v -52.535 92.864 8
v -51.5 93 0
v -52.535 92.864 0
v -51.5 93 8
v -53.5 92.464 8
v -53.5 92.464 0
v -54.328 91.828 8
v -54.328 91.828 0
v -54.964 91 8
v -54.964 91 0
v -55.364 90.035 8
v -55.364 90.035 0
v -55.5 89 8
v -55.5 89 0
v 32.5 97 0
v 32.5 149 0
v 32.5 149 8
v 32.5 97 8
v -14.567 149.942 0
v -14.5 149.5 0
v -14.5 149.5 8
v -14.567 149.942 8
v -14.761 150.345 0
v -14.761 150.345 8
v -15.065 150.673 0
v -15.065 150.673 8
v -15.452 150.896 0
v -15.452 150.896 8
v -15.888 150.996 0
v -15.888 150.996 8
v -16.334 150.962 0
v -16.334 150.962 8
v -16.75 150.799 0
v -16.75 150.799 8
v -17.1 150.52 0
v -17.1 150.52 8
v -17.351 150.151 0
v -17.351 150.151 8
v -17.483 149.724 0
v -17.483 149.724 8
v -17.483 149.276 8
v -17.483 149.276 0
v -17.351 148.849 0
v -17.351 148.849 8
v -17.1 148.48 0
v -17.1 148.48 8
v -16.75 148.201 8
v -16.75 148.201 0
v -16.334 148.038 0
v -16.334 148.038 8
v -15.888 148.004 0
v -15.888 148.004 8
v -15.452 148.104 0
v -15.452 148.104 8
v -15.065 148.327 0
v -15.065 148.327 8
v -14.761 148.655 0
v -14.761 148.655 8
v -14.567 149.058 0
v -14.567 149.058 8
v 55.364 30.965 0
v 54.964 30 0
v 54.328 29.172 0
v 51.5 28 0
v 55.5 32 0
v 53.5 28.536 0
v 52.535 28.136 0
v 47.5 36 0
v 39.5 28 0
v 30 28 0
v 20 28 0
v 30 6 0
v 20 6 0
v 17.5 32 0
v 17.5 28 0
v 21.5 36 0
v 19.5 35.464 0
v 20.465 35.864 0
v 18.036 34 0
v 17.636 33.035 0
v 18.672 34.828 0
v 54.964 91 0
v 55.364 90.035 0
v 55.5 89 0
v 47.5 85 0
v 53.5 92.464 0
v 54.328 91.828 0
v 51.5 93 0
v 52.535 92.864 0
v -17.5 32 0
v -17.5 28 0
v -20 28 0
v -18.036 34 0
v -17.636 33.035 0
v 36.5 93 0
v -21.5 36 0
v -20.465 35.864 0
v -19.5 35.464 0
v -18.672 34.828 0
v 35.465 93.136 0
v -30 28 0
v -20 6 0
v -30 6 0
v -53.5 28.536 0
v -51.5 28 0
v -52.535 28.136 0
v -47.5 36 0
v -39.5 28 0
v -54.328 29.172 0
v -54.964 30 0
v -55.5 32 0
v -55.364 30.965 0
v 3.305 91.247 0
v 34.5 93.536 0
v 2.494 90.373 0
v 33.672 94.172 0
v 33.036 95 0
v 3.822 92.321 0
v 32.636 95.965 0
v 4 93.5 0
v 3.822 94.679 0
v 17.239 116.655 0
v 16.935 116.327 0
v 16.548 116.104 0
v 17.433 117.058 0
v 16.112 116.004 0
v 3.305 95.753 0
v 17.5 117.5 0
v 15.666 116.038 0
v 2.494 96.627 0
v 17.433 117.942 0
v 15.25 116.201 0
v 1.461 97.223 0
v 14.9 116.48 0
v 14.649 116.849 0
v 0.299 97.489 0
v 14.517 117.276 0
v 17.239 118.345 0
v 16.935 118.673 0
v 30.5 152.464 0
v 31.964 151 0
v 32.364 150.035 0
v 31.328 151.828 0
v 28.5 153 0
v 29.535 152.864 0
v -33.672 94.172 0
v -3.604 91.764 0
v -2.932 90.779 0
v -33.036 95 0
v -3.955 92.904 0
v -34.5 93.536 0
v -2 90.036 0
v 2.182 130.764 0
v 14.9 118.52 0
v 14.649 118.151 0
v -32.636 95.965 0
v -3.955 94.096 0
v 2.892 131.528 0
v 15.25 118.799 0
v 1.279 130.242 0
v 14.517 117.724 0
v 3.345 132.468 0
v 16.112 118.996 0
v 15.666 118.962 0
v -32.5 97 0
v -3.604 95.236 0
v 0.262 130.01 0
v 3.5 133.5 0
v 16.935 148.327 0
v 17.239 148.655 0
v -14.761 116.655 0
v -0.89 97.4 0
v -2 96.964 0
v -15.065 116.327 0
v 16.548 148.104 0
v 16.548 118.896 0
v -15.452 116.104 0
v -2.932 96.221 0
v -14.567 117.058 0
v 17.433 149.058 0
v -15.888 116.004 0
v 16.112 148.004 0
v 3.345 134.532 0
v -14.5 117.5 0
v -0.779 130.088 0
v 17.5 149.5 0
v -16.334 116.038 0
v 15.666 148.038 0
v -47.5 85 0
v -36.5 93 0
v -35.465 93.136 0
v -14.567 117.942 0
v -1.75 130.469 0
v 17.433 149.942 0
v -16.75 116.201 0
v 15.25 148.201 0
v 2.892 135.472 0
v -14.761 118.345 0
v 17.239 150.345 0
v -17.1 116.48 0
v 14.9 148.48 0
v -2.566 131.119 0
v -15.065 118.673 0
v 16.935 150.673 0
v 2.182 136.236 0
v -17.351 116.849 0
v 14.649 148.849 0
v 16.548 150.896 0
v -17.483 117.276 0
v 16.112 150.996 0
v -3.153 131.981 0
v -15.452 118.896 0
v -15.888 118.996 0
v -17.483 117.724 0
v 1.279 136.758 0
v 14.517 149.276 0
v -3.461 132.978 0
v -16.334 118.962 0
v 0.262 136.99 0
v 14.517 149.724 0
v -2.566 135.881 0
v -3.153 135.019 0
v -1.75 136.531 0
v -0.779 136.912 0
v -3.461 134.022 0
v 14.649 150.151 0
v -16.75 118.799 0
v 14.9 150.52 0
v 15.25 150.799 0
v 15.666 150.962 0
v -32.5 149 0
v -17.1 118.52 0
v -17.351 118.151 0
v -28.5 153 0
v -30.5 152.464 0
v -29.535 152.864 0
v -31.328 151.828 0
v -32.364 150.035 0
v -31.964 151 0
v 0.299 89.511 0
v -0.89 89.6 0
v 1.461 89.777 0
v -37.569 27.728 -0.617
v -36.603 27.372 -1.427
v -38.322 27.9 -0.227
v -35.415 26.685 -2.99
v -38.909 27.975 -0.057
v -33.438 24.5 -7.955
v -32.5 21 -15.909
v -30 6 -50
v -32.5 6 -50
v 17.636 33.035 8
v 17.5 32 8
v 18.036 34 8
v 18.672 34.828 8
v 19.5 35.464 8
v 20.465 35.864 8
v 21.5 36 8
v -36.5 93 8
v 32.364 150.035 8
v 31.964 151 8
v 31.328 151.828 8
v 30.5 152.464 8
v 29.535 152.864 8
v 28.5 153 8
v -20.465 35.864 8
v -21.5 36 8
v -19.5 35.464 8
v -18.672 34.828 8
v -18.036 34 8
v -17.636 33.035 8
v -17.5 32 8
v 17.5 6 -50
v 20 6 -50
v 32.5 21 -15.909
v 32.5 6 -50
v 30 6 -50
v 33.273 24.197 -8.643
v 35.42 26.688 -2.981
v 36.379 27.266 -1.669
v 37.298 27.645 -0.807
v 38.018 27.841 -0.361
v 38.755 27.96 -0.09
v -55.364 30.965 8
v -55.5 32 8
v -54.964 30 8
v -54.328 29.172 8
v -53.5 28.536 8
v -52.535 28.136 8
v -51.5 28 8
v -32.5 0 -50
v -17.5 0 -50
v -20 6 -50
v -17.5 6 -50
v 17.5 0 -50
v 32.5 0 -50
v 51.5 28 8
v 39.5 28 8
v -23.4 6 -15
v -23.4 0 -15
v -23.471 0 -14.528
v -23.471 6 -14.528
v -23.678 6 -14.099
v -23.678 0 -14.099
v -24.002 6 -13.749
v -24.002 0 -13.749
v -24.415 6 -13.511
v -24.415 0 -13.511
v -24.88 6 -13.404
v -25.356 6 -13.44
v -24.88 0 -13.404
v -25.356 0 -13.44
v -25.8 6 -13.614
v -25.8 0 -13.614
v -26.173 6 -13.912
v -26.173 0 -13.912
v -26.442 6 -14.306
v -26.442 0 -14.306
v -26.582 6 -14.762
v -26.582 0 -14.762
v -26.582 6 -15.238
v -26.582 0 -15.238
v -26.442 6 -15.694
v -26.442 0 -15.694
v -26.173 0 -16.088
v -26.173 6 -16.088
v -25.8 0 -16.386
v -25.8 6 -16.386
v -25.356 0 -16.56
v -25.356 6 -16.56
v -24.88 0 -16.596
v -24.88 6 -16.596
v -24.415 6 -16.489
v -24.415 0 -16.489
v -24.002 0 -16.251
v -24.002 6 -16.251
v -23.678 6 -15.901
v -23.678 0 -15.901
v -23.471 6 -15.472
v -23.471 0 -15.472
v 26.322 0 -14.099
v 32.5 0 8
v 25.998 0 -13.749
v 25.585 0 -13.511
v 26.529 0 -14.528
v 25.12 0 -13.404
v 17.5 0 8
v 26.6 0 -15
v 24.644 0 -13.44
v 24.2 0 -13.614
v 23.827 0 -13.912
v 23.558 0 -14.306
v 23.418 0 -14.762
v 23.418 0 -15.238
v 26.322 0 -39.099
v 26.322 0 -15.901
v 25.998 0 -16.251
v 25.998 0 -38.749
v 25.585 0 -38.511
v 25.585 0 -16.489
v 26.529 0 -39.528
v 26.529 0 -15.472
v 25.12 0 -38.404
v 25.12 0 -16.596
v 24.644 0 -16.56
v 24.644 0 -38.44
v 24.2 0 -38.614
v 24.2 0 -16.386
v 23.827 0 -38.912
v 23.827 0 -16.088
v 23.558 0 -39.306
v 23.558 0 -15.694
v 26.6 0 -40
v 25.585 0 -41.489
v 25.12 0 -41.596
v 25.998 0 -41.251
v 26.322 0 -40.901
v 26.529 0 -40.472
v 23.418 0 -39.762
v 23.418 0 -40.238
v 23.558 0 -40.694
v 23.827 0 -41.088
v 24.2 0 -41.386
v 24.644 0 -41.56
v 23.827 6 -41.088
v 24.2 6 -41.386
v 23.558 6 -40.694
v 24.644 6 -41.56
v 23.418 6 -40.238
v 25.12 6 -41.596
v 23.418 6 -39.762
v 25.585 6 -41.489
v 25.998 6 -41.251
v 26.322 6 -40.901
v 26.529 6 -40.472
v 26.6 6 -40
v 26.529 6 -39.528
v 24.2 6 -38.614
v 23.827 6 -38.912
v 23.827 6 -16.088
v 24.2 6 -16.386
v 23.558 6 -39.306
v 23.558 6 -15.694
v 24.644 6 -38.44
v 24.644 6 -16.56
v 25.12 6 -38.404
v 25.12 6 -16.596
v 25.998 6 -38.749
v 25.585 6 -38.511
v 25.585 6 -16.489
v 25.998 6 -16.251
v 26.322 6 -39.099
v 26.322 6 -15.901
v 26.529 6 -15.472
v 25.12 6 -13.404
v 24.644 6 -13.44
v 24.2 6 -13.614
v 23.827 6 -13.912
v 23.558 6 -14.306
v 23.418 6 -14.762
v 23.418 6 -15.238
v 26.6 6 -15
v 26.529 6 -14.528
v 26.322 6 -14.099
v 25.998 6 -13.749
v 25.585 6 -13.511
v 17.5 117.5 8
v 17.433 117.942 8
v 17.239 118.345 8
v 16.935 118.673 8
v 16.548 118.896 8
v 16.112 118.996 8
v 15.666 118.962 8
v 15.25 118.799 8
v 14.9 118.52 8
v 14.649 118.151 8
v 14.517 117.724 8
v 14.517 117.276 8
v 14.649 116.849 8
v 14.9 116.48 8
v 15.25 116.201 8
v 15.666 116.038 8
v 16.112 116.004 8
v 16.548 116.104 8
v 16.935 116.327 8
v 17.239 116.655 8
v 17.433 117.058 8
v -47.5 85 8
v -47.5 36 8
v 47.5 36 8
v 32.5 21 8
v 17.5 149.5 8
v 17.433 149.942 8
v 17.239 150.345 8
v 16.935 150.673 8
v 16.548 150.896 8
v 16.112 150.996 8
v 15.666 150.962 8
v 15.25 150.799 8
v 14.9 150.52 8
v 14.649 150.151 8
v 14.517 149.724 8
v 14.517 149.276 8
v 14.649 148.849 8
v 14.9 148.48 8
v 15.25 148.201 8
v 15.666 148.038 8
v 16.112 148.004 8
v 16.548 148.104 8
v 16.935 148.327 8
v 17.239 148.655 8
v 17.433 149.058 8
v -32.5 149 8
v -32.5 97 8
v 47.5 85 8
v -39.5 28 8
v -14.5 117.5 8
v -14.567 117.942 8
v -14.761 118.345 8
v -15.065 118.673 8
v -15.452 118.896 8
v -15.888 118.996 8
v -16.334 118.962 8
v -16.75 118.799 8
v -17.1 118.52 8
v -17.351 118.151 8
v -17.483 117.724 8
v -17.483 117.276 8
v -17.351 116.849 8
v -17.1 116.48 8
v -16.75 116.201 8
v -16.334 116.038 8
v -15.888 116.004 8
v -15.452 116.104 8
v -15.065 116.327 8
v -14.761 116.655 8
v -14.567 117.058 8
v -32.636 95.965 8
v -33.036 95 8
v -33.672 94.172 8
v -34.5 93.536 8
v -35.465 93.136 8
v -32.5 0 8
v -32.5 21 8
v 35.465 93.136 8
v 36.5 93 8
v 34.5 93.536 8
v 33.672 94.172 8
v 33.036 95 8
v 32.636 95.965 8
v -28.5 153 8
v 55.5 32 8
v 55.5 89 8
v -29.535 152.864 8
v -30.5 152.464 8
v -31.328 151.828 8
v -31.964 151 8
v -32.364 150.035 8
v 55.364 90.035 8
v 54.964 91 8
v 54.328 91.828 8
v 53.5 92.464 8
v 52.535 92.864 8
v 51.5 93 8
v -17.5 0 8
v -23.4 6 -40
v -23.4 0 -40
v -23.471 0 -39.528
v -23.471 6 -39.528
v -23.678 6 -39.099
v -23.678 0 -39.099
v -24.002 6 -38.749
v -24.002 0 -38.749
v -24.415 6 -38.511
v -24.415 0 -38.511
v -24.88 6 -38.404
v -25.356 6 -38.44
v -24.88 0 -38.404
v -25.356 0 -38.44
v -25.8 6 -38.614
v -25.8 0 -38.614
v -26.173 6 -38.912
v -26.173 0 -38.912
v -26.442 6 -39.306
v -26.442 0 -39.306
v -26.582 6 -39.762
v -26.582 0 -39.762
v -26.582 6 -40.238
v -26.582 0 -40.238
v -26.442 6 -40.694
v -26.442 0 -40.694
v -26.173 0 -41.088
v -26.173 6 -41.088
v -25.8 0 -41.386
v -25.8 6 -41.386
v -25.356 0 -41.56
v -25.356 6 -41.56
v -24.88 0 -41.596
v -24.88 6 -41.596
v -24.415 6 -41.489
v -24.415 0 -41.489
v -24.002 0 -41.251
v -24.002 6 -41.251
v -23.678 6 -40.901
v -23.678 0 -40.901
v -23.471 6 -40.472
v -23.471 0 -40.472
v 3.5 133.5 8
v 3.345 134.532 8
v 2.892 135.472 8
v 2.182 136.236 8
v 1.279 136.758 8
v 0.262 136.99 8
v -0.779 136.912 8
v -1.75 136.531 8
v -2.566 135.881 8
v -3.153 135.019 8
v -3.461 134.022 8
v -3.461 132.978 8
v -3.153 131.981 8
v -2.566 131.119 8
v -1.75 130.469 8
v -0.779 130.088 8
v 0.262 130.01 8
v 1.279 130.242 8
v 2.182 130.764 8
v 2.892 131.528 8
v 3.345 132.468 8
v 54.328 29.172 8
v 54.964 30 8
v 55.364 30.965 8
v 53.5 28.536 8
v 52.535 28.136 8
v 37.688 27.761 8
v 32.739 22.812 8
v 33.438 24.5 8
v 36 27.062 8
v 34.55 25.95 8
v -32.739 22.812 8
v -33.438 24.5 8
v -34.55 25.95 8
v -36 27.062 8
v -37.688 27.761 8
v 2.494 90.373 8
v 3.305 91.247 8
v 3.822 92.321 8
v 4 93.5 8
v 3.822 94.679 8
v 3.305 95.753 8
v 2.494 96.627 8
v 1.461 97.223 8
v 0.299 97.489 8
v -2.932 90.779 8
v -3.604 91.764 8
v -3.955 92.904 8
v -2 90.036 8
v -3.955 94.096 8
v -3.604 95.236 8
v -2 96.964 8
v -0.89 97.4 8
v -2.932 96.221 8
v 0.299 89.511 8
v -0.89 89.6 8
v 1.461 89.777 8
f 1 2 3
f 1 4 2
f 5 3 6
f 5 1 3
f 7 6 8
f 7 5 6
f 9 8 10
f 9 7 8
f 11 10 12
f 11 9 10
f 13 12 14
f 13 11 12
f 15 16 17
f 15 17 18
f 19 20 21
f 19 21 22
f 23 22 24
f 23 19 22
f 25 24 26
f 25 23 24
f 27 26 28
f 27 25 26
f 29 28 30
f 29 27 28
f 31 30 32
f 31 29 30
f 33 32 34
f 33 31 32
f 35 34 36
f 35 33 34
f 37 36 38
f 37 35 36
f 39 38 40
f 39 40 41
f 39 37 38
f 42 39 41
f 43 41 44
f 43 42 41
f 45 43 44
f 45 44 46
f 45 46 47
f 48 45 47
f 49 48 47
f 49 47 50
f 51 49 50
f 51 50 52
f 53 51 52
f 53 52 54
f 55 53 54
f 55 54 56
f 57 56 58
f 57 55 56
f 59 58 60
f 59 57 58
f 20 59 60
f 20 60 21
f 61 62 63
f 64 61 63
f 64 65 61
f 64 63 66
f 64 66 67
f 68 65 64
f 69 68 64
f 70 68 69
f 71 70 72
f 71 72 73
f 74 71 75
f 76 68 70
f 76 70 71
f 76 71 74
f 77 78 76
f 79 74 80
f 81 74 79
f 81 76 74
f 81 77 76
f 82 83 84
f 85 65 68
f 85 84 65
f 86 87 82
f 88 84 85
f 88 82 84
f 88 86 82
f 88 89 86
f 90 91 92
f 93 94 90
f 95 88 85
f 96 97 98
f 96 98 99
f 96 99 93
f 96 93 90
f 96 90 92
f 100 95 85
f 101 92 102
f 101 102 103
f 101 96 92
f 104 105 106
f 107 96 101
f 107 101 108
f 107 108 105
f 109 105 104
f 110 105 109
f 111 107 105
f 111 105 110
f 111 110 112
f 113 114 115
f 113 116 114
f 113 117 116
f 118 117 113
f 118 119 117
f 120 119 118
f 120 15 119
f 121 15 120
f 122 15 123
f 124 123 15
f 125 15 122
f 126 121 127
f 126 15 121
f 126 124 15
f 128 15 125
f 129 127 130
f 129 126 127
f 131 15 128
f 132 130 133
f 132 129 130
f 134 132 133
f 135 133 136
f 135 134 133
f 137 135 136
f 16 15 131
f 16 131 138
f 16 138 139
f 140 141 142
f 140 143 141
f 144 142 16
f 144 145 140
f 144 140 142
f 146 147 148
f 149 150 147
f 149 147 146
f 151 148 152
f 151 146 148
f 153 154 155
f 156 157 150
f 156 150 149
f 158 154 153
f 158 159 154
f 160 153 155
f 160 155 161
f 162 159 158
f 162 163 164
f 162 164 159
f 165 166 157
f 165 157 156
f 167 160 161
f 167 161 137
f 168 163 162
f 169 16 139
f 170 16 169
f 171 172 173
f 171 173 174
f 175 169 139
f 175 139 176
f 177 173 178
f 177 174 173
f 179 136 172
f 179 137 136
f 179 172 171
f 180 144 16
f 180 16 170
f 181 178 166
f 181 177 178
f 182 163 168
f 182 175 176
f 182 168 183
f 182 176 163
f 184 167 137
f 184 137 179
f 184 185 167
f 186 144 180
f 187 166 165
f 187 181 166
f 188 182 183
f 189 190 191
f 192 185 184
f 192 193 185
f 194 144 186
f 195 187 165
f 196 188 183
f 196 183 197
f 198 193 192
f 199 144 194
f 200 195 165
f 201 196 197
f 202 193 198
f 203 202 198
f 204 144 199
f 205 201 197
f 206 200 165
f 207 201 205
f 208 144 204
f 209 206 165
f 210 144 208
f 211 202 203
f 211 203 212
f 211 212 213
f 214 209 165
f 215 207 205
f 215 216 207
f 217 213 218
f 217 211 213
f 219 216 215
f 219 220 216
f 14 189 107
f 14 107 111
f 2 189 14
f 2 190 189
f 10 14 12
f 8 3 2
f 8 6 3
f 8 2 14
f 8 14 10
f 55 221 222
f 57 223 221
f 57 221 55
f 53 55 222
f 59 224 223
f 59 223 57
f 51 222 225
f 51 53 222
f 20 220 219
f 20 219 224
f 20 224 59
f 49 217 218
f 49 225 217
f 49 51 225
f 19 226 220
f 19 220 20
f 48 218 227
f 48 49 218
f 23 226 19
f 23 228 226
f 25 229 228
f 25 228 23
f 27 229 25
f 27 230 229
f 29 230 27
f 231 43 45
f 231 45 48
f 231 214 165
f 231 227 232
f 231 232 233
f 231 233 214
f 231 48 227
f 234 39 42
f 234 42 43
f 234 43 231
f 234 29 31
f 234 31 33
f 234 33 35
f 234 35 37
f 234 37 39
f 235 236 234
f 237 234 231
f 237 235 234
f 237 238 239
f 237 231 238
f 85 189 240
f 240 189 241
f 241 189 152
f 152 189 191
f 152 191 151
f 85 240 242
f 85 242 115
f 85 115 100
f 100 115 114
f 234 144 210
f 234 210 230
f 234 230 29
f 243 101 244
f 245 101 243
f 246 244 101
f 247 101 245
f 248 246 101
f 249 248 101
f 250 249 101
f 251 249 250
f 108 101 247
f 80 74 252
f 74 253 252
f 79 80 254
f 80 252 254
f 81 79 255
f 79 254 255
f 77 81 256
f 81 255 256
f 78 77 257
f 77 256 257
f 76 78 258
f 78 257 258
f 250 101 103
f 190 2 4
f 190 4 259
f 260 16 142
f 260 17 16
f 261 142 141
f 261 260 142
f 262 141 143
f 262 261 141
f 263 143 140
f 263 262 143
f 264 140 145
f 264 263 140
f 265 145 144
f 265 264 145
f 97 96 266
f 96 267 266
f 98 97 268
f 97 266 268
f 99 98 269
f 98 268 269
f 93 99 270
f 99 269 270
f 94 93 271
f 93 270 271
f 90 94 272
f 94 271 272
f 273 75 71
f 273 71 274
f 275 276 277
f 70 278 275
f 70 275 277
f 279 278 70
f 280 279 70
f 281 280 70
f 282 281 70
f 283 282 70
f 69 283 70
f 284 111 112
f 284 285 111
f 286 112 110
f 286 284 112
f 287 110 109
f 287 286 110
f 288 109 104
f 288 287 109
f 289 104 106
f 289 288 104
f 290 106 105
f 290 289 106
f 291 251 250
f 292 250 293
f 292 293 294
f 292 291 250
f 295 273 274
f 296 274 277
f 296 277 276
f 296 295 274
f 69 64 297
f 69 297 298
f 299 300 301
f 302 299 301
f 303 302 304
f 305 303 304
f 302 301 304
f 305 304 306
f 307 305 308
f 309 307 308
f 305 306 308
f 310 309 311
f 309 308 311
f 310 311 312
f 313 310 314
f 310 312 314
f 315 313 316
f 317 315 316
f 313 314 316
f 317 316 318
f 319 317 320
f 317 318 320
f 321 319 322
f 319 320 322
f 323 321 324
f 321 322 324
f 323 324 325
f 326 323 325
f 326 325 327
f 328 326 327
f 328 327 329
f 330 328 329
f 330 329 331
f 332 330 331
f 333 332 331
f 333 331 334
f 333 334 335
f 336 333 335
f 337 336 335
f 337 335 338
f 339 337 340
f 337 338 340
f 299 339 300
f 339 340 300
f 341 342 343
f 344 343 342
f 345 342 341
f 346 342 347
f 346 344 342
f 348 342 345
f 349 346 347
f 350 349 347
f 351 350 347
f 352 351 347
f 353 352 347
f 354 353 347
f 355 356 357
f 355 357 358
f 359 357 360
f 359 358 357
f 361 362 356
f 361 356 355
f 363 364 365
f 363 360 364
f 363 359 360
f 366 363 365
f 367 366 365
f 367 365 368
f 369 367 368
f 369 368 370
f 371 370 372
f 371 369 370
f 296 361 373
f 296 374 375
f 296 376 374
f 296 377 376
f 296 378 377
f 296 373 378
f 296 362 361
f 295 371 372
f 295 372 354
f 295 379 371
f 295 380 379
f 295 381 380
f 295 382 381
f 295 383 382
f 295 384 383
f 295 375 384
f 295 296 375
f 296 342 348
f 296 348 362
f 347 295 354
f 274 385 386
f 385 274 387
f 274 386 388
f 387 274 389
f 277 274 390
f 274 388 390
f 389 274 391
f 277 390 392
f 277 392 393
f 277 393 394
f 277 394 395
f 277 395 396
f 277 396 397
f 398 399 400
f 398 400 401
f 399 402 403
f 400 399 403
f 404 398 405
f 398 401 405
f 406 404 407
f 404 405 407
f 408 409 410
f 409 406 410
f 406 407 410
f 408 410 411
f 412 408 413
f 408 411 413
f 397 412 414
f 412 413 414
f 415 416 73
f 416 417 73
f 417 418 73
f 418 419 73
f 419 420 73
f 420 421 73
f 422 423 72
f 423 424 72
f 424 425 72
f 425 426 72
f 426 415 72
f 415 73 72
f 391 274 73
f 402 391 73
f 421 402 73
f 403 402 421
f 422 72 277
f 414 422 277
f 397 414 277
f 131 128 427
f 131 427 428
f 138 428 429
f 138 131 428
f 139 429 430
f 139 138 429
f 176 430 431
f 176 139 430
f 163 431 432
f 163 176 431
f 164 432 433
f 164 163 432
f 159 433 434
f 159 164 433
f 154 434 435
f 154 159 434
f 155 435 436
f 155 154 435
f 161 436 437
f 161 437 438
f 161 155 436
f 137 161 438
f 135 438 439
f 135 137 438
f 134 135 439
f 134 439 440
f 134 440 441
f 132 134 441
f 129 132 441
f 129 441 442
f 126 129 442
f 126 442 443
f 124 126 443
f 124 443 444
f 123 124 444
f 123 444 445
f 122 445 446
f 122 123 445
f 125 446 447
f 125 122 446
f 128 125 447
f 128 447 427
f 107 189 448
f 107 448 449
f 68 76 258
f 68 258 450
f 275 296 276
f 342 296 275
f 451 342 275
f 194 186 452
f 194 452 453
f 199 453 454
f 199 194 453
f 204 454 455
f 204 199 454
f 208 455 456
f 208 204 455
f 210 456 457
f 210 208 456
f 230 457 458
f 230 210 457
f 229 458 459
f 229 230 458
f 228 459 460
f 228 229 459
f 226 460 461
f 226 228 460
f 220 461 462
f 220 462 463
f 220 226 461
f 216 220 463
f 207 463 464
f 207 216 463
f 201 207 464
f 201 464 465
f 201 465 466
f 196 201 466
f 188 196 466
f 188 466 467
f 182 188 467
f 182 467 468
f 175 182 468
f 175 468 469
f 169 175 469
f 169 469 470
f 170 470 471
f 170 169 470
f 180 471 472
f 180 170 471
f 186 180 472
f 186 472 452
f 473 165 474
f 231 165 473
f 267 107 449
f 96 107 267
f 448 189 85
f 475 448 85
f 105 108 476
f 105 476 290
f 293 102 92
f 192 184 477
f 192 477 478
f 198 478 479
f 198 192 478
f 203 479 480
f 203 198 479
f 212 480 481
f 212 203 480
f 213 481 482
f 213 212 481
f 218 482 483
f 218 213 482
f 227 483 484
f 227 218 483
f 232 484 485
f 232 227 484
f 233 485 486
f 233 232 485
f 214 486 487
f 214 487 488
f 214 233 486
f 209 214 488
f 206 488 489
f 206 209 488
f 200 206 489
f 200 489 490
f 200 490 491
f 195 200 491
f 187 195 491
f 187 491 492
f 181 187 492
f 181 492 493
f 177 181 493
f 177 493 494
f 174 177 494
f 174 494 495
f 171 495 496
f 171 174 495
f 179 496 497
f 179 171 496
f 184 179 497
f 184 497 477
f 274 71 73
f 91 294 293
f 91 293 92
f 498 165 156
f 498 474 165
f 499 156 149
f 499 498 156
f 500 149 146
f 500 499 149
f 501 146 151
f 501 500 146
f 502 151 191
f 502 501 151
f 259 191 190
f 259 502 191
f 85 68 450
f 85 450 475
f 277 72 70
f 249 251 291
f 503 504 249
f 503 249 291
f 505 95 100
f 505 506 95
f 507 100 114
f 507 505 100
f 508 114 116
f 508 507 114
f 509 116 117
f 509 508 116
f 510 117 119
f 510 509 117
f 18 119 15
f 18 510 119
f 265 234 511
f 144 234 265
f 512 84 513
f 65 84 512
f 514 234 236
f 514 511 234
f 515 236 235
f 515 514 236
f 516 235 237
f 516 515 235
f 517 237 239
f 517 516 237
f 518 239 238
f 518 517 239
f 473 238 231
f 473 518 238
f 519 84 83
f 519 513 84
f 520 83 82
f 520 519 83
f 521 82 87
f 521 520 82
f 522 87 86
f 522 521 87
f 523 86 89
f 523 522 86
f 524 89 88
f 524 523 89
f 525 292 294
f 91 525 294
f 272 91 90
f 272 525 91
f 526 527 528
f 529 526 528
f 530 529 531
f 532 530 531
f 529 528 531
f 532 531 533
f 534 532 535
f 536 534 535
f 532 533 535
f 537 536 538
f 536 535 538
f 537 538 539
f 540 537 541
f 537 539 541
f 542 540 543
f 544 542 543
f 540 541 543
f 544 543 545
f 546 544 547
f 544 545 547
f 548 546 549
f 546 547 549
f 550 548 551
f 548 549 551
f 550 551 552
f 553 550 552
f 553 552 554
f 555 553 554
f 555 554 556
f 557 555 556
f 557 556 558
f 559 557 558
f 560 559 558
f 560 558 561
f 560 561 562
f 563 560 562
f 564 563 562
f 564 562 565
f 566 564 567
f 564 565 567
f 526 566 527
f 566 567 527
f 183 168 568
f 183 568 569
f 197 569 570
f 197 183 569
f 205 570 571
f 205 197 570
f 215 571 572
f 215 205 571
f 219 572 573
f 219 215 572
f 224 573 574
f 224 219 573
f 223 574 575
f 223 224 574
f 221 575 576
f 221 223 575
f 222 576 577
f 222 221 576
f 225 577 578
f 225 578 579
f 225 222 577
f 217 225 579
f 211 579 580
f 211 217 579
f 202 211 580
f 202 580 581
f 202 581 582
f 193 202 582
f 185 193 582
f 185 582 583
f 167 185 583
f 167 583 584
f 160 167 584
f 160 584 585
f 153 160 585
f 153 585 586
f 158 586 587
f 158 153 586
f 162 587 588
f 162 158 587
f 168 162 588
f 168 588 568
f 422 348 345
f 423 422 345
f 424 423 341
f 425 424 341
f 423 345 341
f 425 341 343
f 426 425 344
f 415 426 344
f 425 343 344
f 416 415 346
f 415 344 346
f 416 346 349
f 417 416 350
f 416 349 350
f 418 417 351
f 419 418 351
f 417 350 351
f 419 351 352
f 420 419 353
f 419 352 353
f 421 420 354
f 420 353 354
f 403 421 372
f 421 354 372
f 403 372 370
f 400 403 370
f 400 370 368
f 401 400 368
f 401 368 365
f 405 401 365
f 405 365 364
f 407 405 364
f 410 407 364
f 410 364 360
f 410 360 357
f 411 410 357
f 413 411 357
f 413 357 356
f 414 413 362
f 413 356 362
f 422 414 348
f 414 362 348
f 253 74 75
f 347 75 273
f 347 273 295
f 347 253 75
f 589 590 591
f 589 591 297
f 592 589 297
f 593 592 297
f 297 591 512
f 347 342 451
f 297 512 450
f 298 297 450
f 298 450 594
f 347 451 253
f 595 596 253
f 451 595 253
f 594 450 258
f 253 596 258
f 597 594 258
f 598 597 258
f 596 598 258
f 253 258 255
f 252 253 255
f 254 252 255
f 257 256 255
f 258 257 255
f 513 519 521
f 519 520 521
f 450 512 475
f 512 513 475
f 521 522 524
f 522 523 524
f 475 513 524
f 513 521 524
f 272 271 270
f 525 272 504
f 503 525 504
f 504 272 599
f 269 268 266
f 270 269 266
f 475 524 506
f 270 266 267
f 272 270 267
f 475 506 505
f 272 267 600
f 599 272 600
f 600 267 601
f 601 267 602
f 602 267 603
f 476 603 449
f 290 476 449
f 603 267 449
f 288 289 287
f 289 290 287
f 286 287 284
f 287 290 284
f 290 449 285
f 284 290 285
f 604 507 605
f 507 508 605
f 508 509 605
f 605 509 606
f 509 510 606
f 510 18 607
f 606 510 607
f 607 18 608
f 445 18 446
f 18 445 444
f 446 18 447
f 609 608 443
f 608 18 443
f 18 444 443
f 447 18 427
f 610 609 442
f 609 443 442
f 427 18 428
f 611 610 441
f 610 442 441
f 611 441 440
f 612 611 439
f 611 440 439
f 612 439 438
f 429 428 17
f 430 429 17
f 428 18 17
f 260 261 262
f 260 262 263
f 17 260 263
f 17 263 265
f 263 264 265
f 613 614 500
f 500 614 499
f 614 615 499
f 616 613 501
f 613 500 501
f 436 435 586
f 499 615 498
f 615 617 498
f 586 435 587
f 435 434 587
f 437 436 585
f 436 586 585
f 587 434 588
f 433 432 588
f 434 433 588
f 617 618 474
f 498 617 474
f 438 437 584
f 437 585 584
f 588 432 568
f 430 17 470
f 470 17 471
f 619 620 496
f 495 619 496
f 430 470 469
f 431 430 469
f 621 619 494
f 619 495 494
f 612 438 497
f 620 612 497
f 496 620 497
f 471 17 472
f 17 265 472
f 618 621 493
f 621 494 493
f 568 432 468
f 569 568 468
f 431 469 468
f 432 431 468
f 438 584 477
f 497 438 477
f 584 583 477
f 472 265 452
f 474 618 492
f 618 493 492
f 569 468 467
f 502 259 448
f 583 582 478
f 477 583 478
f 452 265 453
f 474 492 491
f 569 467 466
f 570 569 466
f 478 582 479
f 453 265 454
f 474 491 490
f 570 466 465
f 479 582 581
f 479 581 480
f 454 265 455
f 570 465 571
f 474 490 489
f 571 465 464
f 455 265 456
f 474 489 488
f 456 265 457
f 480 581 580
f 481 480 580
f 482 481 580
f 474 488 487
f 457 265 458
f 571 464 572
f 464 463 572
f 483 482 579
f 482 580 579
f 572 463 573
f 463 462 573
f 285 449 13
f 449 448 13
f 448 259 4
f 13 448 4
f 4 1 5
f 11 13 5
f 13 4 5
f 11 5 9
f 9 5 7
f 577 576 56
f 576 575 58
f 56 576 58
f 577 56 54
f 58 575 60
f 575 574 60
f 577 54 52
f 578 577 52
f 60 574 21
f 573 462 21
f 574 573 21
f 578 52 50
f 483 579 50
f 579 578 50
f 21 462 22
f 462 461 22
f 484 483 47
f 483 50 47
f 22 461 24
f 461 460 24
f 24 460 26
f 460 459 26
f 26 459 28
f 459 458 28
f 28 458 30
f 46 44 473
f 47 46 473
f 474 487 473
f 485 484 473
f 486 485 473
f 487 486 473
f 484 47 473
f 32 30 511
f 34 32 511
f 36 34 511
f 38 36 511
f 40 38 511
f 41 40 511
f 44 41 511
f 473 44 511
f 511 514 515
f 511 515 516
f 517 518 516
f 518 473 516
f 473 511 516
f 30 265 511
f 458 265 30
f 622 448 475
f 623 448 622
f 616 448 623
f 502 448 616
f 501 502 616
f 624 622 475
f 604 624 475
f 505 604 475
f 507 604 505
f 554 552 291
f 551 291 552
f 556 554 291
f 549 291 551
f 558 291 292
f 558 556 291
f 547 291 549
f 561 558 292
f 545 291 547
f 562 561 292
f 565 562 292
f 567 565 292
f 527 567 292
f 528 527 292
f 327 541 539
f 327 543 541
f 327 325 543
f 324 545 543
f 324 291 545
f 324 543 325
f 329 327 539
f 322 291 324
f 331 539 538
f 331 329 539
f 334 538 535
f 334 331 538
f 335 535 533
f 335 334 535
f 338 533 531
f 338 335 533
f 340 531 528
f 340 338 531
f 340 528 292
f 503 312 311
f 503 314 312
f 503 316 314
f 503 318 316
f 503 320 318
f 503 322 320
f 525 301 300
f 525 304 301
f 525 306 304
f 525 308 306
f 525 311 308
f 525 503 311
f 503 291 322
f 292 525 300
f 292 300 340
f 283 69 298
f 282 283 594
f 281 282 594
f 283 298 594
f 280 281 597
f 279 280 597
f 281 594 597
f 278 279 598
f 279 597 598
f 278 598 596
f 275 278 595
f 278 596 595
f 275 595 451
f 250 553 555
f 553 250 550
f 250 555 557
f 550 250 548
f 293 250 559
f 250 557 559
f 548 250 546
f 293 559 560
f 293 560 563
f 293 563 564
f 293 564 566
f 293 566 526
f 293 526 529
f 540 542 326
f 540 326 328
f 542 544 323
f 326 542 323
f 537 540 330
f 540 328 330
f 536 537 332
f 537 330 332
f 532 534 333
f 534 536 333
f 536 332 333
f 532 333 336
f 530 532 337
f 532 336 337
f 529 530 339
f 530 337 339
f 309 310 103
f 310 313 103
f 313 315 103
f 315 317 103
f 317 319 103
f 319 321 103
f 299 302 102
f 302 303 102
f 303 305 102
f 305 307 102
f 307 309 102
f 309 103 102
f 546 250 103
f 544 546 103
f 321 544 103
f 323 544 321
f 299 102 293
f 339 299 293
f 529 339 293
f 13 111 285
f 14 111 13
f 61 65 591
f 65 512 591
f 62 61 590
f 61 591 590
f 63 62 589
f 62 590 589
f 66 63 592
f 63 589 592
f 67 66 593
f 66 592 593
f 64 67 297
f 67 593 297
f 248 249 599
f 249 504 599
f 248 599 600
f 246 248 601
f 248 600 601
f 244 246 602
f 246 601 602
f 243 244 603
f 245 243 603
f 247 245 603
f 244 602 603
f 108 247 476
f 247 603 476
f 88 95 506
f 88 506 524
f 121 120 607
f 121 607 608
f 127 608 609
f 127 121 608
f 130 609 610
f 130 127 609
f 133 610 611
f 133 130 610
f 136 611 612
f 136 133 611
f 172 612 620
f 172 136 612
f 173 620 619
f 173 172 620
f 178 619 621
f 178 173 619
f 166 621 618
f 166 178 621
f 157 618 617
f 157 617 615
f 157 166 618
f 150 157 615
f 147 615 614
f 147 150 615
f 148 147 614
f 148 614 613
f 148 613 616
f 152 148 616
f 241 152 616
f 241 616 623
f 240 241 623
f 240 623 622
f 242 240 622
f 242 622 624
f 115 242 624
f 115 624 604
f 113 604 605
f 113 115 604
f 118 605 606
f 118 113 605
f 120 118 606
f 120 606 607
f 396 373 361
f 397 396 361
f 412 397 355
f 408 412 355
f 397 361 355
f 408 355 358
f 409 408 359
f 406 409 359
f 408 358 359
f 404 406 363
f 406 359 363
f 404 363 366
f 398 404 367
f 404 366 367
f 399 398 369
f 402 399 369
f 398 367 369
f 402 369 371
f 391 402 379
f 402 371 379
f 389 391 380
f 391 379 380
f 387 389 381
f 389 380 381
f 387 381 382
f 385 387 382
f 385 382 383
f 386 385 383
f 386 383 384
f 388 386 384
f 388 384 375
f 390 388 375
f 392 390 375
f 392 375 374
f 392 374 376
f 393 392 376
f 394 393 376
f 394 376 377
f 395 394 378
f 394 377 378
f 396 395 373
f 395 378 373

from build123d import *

# Parameters (mm, degrees)
SKETCH_R     = 4
SKETCH_R_2   = 3.5
SKETCH_R_3   = 1.5
PAD_DEPTH    = 8
SKETCH001_W  = 15
SKETCH001_H  = 6
PAD001_DEPTH = 50
PAD002_DEPTH = 2.5
PAD003_DEPTH = 2.5
PAD004_DEPTH = 2.5
PAD005_DEPTH = 2.5
SKETCH006_R  = 1.6
POCKET_DEPTH = 6
FILLET_R     = 7
FILLET001_R  = 4
FILLET002_R  = 4


with BuildPart() as part:
    # Sketch → Pad (new body)
    with BuildSketch(Plane.XY):
        Polygon((-17.5, 0), (-32.5, 0), (-32.5, 28), (-55.5, 28), (-55.5, 93), (-32.5, 93), (-32.5, 153), (32.5, 153), (32.5, 93), (55.5, 93), (55.5, 28), (32.5, 28), (32.5, 0), (17.5, 0), (17.5, 36), (47.5, 36), (47.5, 85), (17.5, 85), (-17.5, 85), (-47.5, 85), (-47.5, 36), (-17.5, 36), align=None)
        with Locations((0, 93.5)):
            Circle(SKETCH_R, mode=Mode.SUBTRACT)
        with Locations((0, 133.5)):
            Circle(SKETCH_R_2, mode=Mode.SUBTRACT)
        with Locations((-16, 149.5)):
            Circle(SKETCH_R_3, mode=Mode.SUBTRACT)
        with Locations((16, 149.5)):
            Circle(SKETCH_R_3, mode=Mode.SUBTRACT)
        with Locations((16, 117.5)):
            Circle(SKETCH_R_3, mode=Mode.SUBTRACT)
        with Locations((-16, 117.5)):
            Circle(SKETCH_R_3, mode=Mode.SUBTRACT)
    extrude(amount=PAD_DEPTH)

    # Sketch001 (on Face20 of Pad) → Pad001 (join)
    with BuildSketch(Plane(origin=(0, 0, 0), x_dir=(1, 0, 0), z_dir=(0, 0, -1))):
        with Locations((-25, -3)):
            Rectangle(SKETCH001_W, SKETCH001_H)
        with Locations((25, -3)):
            Rectangle(SKETCH001_W, SKETCH001_H)
    extrude(amount=PAD001_DEPTH)

    # Sketch002 (on Face31 of Pad001) → Pad002 (join)
    with BuildSketch(Plane.YZ.offset(32.5)):
        Polygon((6, 0), (6, -50), (28, 0), align=None)
    extrude(amount=-PAD002_DEPTH)

    # Sketch003 (on Face14 of Pad002) → Pad003 (join)
    with BuildSketch(Plane(origin=(17.5, 0, 0), x_dir=(0, -1, 0), z_dir=(-1, 0, 0))):
        Polygon((-6, 0), (-28, 0), (-6, -50), align=None)
    extrude(amount=-PAD003_DEPTH)

    # Sketch004 (on Face3 of Pad003) → Pad004 (join)
    with BuildSketch(Plane(origin=(-32.5, 0, 0), x_dir=(0, -1, 0), z_dir=(-1, 0, 0))):
        Polygon((-6, -50), (-6, 0), (-28, 0), align=None)
    extrude(amount=-PAD004_DEPTH)

    # Sketch005 (on Face20 of Pad004) → Pad005 (join)
    with BuildSketch(Plane.YZ.offset(-17.5)):
        Polygon((28, 0), (6, 0), (6, -50), align=None)
    extrude(amount=-PAD005_DEPTH)

    # Sketch006 (on Face2 of Pad005) → Pocket (cut)
    with BuildSketch(Plane.XZ):
        with Locations((25, -40)):
            Circle(SKETCH006_R)
        with Locations((25, -15)):
            Circle(SKETCH006_R)
        with Locations((-25, -15)):
            Circle(SKETCH006_R)
        with Locations((-25, -40)):
            Circle(SKETCH006_R)
    extrude(amount=-POCKET_DEPTH, mode=Mode.SUBTRACT)

    # Fillet
    fillet_edges = [part.edges().sort_by_distance(p)[0] for p in [
        (-32.5, 28, 4),
        (32.5, 28, 4),
    ]]
    fillet(fillet_edges, radius=FILLET_R)

    # Fillet001
    fillet001_edges = [part.edges().sort_by_distance(p)[0] for p in [
        (-55.5, 28, 4),
        (-55.5, 93, 4),
        (-32.5, 93, 4),
        (-32.5, 153, 4),
        (32.5, 153, 4),
        (32.5, 93, 4),
        (55.5, 93, 4),
        (55.5, 28, 4),
    ]]
    fillet(fillet001_edges, radius=FILLET001_R)

    # Fillet002
    fillet002_edges = [part.edges().sort_by_distance(p)[0] for p in [
        (17.5, 36, 4),
        (-17.5, 36, 4),
    ]]
    fillet(fillet002_edges, radius=FILLET002_R)


solid = part.part
